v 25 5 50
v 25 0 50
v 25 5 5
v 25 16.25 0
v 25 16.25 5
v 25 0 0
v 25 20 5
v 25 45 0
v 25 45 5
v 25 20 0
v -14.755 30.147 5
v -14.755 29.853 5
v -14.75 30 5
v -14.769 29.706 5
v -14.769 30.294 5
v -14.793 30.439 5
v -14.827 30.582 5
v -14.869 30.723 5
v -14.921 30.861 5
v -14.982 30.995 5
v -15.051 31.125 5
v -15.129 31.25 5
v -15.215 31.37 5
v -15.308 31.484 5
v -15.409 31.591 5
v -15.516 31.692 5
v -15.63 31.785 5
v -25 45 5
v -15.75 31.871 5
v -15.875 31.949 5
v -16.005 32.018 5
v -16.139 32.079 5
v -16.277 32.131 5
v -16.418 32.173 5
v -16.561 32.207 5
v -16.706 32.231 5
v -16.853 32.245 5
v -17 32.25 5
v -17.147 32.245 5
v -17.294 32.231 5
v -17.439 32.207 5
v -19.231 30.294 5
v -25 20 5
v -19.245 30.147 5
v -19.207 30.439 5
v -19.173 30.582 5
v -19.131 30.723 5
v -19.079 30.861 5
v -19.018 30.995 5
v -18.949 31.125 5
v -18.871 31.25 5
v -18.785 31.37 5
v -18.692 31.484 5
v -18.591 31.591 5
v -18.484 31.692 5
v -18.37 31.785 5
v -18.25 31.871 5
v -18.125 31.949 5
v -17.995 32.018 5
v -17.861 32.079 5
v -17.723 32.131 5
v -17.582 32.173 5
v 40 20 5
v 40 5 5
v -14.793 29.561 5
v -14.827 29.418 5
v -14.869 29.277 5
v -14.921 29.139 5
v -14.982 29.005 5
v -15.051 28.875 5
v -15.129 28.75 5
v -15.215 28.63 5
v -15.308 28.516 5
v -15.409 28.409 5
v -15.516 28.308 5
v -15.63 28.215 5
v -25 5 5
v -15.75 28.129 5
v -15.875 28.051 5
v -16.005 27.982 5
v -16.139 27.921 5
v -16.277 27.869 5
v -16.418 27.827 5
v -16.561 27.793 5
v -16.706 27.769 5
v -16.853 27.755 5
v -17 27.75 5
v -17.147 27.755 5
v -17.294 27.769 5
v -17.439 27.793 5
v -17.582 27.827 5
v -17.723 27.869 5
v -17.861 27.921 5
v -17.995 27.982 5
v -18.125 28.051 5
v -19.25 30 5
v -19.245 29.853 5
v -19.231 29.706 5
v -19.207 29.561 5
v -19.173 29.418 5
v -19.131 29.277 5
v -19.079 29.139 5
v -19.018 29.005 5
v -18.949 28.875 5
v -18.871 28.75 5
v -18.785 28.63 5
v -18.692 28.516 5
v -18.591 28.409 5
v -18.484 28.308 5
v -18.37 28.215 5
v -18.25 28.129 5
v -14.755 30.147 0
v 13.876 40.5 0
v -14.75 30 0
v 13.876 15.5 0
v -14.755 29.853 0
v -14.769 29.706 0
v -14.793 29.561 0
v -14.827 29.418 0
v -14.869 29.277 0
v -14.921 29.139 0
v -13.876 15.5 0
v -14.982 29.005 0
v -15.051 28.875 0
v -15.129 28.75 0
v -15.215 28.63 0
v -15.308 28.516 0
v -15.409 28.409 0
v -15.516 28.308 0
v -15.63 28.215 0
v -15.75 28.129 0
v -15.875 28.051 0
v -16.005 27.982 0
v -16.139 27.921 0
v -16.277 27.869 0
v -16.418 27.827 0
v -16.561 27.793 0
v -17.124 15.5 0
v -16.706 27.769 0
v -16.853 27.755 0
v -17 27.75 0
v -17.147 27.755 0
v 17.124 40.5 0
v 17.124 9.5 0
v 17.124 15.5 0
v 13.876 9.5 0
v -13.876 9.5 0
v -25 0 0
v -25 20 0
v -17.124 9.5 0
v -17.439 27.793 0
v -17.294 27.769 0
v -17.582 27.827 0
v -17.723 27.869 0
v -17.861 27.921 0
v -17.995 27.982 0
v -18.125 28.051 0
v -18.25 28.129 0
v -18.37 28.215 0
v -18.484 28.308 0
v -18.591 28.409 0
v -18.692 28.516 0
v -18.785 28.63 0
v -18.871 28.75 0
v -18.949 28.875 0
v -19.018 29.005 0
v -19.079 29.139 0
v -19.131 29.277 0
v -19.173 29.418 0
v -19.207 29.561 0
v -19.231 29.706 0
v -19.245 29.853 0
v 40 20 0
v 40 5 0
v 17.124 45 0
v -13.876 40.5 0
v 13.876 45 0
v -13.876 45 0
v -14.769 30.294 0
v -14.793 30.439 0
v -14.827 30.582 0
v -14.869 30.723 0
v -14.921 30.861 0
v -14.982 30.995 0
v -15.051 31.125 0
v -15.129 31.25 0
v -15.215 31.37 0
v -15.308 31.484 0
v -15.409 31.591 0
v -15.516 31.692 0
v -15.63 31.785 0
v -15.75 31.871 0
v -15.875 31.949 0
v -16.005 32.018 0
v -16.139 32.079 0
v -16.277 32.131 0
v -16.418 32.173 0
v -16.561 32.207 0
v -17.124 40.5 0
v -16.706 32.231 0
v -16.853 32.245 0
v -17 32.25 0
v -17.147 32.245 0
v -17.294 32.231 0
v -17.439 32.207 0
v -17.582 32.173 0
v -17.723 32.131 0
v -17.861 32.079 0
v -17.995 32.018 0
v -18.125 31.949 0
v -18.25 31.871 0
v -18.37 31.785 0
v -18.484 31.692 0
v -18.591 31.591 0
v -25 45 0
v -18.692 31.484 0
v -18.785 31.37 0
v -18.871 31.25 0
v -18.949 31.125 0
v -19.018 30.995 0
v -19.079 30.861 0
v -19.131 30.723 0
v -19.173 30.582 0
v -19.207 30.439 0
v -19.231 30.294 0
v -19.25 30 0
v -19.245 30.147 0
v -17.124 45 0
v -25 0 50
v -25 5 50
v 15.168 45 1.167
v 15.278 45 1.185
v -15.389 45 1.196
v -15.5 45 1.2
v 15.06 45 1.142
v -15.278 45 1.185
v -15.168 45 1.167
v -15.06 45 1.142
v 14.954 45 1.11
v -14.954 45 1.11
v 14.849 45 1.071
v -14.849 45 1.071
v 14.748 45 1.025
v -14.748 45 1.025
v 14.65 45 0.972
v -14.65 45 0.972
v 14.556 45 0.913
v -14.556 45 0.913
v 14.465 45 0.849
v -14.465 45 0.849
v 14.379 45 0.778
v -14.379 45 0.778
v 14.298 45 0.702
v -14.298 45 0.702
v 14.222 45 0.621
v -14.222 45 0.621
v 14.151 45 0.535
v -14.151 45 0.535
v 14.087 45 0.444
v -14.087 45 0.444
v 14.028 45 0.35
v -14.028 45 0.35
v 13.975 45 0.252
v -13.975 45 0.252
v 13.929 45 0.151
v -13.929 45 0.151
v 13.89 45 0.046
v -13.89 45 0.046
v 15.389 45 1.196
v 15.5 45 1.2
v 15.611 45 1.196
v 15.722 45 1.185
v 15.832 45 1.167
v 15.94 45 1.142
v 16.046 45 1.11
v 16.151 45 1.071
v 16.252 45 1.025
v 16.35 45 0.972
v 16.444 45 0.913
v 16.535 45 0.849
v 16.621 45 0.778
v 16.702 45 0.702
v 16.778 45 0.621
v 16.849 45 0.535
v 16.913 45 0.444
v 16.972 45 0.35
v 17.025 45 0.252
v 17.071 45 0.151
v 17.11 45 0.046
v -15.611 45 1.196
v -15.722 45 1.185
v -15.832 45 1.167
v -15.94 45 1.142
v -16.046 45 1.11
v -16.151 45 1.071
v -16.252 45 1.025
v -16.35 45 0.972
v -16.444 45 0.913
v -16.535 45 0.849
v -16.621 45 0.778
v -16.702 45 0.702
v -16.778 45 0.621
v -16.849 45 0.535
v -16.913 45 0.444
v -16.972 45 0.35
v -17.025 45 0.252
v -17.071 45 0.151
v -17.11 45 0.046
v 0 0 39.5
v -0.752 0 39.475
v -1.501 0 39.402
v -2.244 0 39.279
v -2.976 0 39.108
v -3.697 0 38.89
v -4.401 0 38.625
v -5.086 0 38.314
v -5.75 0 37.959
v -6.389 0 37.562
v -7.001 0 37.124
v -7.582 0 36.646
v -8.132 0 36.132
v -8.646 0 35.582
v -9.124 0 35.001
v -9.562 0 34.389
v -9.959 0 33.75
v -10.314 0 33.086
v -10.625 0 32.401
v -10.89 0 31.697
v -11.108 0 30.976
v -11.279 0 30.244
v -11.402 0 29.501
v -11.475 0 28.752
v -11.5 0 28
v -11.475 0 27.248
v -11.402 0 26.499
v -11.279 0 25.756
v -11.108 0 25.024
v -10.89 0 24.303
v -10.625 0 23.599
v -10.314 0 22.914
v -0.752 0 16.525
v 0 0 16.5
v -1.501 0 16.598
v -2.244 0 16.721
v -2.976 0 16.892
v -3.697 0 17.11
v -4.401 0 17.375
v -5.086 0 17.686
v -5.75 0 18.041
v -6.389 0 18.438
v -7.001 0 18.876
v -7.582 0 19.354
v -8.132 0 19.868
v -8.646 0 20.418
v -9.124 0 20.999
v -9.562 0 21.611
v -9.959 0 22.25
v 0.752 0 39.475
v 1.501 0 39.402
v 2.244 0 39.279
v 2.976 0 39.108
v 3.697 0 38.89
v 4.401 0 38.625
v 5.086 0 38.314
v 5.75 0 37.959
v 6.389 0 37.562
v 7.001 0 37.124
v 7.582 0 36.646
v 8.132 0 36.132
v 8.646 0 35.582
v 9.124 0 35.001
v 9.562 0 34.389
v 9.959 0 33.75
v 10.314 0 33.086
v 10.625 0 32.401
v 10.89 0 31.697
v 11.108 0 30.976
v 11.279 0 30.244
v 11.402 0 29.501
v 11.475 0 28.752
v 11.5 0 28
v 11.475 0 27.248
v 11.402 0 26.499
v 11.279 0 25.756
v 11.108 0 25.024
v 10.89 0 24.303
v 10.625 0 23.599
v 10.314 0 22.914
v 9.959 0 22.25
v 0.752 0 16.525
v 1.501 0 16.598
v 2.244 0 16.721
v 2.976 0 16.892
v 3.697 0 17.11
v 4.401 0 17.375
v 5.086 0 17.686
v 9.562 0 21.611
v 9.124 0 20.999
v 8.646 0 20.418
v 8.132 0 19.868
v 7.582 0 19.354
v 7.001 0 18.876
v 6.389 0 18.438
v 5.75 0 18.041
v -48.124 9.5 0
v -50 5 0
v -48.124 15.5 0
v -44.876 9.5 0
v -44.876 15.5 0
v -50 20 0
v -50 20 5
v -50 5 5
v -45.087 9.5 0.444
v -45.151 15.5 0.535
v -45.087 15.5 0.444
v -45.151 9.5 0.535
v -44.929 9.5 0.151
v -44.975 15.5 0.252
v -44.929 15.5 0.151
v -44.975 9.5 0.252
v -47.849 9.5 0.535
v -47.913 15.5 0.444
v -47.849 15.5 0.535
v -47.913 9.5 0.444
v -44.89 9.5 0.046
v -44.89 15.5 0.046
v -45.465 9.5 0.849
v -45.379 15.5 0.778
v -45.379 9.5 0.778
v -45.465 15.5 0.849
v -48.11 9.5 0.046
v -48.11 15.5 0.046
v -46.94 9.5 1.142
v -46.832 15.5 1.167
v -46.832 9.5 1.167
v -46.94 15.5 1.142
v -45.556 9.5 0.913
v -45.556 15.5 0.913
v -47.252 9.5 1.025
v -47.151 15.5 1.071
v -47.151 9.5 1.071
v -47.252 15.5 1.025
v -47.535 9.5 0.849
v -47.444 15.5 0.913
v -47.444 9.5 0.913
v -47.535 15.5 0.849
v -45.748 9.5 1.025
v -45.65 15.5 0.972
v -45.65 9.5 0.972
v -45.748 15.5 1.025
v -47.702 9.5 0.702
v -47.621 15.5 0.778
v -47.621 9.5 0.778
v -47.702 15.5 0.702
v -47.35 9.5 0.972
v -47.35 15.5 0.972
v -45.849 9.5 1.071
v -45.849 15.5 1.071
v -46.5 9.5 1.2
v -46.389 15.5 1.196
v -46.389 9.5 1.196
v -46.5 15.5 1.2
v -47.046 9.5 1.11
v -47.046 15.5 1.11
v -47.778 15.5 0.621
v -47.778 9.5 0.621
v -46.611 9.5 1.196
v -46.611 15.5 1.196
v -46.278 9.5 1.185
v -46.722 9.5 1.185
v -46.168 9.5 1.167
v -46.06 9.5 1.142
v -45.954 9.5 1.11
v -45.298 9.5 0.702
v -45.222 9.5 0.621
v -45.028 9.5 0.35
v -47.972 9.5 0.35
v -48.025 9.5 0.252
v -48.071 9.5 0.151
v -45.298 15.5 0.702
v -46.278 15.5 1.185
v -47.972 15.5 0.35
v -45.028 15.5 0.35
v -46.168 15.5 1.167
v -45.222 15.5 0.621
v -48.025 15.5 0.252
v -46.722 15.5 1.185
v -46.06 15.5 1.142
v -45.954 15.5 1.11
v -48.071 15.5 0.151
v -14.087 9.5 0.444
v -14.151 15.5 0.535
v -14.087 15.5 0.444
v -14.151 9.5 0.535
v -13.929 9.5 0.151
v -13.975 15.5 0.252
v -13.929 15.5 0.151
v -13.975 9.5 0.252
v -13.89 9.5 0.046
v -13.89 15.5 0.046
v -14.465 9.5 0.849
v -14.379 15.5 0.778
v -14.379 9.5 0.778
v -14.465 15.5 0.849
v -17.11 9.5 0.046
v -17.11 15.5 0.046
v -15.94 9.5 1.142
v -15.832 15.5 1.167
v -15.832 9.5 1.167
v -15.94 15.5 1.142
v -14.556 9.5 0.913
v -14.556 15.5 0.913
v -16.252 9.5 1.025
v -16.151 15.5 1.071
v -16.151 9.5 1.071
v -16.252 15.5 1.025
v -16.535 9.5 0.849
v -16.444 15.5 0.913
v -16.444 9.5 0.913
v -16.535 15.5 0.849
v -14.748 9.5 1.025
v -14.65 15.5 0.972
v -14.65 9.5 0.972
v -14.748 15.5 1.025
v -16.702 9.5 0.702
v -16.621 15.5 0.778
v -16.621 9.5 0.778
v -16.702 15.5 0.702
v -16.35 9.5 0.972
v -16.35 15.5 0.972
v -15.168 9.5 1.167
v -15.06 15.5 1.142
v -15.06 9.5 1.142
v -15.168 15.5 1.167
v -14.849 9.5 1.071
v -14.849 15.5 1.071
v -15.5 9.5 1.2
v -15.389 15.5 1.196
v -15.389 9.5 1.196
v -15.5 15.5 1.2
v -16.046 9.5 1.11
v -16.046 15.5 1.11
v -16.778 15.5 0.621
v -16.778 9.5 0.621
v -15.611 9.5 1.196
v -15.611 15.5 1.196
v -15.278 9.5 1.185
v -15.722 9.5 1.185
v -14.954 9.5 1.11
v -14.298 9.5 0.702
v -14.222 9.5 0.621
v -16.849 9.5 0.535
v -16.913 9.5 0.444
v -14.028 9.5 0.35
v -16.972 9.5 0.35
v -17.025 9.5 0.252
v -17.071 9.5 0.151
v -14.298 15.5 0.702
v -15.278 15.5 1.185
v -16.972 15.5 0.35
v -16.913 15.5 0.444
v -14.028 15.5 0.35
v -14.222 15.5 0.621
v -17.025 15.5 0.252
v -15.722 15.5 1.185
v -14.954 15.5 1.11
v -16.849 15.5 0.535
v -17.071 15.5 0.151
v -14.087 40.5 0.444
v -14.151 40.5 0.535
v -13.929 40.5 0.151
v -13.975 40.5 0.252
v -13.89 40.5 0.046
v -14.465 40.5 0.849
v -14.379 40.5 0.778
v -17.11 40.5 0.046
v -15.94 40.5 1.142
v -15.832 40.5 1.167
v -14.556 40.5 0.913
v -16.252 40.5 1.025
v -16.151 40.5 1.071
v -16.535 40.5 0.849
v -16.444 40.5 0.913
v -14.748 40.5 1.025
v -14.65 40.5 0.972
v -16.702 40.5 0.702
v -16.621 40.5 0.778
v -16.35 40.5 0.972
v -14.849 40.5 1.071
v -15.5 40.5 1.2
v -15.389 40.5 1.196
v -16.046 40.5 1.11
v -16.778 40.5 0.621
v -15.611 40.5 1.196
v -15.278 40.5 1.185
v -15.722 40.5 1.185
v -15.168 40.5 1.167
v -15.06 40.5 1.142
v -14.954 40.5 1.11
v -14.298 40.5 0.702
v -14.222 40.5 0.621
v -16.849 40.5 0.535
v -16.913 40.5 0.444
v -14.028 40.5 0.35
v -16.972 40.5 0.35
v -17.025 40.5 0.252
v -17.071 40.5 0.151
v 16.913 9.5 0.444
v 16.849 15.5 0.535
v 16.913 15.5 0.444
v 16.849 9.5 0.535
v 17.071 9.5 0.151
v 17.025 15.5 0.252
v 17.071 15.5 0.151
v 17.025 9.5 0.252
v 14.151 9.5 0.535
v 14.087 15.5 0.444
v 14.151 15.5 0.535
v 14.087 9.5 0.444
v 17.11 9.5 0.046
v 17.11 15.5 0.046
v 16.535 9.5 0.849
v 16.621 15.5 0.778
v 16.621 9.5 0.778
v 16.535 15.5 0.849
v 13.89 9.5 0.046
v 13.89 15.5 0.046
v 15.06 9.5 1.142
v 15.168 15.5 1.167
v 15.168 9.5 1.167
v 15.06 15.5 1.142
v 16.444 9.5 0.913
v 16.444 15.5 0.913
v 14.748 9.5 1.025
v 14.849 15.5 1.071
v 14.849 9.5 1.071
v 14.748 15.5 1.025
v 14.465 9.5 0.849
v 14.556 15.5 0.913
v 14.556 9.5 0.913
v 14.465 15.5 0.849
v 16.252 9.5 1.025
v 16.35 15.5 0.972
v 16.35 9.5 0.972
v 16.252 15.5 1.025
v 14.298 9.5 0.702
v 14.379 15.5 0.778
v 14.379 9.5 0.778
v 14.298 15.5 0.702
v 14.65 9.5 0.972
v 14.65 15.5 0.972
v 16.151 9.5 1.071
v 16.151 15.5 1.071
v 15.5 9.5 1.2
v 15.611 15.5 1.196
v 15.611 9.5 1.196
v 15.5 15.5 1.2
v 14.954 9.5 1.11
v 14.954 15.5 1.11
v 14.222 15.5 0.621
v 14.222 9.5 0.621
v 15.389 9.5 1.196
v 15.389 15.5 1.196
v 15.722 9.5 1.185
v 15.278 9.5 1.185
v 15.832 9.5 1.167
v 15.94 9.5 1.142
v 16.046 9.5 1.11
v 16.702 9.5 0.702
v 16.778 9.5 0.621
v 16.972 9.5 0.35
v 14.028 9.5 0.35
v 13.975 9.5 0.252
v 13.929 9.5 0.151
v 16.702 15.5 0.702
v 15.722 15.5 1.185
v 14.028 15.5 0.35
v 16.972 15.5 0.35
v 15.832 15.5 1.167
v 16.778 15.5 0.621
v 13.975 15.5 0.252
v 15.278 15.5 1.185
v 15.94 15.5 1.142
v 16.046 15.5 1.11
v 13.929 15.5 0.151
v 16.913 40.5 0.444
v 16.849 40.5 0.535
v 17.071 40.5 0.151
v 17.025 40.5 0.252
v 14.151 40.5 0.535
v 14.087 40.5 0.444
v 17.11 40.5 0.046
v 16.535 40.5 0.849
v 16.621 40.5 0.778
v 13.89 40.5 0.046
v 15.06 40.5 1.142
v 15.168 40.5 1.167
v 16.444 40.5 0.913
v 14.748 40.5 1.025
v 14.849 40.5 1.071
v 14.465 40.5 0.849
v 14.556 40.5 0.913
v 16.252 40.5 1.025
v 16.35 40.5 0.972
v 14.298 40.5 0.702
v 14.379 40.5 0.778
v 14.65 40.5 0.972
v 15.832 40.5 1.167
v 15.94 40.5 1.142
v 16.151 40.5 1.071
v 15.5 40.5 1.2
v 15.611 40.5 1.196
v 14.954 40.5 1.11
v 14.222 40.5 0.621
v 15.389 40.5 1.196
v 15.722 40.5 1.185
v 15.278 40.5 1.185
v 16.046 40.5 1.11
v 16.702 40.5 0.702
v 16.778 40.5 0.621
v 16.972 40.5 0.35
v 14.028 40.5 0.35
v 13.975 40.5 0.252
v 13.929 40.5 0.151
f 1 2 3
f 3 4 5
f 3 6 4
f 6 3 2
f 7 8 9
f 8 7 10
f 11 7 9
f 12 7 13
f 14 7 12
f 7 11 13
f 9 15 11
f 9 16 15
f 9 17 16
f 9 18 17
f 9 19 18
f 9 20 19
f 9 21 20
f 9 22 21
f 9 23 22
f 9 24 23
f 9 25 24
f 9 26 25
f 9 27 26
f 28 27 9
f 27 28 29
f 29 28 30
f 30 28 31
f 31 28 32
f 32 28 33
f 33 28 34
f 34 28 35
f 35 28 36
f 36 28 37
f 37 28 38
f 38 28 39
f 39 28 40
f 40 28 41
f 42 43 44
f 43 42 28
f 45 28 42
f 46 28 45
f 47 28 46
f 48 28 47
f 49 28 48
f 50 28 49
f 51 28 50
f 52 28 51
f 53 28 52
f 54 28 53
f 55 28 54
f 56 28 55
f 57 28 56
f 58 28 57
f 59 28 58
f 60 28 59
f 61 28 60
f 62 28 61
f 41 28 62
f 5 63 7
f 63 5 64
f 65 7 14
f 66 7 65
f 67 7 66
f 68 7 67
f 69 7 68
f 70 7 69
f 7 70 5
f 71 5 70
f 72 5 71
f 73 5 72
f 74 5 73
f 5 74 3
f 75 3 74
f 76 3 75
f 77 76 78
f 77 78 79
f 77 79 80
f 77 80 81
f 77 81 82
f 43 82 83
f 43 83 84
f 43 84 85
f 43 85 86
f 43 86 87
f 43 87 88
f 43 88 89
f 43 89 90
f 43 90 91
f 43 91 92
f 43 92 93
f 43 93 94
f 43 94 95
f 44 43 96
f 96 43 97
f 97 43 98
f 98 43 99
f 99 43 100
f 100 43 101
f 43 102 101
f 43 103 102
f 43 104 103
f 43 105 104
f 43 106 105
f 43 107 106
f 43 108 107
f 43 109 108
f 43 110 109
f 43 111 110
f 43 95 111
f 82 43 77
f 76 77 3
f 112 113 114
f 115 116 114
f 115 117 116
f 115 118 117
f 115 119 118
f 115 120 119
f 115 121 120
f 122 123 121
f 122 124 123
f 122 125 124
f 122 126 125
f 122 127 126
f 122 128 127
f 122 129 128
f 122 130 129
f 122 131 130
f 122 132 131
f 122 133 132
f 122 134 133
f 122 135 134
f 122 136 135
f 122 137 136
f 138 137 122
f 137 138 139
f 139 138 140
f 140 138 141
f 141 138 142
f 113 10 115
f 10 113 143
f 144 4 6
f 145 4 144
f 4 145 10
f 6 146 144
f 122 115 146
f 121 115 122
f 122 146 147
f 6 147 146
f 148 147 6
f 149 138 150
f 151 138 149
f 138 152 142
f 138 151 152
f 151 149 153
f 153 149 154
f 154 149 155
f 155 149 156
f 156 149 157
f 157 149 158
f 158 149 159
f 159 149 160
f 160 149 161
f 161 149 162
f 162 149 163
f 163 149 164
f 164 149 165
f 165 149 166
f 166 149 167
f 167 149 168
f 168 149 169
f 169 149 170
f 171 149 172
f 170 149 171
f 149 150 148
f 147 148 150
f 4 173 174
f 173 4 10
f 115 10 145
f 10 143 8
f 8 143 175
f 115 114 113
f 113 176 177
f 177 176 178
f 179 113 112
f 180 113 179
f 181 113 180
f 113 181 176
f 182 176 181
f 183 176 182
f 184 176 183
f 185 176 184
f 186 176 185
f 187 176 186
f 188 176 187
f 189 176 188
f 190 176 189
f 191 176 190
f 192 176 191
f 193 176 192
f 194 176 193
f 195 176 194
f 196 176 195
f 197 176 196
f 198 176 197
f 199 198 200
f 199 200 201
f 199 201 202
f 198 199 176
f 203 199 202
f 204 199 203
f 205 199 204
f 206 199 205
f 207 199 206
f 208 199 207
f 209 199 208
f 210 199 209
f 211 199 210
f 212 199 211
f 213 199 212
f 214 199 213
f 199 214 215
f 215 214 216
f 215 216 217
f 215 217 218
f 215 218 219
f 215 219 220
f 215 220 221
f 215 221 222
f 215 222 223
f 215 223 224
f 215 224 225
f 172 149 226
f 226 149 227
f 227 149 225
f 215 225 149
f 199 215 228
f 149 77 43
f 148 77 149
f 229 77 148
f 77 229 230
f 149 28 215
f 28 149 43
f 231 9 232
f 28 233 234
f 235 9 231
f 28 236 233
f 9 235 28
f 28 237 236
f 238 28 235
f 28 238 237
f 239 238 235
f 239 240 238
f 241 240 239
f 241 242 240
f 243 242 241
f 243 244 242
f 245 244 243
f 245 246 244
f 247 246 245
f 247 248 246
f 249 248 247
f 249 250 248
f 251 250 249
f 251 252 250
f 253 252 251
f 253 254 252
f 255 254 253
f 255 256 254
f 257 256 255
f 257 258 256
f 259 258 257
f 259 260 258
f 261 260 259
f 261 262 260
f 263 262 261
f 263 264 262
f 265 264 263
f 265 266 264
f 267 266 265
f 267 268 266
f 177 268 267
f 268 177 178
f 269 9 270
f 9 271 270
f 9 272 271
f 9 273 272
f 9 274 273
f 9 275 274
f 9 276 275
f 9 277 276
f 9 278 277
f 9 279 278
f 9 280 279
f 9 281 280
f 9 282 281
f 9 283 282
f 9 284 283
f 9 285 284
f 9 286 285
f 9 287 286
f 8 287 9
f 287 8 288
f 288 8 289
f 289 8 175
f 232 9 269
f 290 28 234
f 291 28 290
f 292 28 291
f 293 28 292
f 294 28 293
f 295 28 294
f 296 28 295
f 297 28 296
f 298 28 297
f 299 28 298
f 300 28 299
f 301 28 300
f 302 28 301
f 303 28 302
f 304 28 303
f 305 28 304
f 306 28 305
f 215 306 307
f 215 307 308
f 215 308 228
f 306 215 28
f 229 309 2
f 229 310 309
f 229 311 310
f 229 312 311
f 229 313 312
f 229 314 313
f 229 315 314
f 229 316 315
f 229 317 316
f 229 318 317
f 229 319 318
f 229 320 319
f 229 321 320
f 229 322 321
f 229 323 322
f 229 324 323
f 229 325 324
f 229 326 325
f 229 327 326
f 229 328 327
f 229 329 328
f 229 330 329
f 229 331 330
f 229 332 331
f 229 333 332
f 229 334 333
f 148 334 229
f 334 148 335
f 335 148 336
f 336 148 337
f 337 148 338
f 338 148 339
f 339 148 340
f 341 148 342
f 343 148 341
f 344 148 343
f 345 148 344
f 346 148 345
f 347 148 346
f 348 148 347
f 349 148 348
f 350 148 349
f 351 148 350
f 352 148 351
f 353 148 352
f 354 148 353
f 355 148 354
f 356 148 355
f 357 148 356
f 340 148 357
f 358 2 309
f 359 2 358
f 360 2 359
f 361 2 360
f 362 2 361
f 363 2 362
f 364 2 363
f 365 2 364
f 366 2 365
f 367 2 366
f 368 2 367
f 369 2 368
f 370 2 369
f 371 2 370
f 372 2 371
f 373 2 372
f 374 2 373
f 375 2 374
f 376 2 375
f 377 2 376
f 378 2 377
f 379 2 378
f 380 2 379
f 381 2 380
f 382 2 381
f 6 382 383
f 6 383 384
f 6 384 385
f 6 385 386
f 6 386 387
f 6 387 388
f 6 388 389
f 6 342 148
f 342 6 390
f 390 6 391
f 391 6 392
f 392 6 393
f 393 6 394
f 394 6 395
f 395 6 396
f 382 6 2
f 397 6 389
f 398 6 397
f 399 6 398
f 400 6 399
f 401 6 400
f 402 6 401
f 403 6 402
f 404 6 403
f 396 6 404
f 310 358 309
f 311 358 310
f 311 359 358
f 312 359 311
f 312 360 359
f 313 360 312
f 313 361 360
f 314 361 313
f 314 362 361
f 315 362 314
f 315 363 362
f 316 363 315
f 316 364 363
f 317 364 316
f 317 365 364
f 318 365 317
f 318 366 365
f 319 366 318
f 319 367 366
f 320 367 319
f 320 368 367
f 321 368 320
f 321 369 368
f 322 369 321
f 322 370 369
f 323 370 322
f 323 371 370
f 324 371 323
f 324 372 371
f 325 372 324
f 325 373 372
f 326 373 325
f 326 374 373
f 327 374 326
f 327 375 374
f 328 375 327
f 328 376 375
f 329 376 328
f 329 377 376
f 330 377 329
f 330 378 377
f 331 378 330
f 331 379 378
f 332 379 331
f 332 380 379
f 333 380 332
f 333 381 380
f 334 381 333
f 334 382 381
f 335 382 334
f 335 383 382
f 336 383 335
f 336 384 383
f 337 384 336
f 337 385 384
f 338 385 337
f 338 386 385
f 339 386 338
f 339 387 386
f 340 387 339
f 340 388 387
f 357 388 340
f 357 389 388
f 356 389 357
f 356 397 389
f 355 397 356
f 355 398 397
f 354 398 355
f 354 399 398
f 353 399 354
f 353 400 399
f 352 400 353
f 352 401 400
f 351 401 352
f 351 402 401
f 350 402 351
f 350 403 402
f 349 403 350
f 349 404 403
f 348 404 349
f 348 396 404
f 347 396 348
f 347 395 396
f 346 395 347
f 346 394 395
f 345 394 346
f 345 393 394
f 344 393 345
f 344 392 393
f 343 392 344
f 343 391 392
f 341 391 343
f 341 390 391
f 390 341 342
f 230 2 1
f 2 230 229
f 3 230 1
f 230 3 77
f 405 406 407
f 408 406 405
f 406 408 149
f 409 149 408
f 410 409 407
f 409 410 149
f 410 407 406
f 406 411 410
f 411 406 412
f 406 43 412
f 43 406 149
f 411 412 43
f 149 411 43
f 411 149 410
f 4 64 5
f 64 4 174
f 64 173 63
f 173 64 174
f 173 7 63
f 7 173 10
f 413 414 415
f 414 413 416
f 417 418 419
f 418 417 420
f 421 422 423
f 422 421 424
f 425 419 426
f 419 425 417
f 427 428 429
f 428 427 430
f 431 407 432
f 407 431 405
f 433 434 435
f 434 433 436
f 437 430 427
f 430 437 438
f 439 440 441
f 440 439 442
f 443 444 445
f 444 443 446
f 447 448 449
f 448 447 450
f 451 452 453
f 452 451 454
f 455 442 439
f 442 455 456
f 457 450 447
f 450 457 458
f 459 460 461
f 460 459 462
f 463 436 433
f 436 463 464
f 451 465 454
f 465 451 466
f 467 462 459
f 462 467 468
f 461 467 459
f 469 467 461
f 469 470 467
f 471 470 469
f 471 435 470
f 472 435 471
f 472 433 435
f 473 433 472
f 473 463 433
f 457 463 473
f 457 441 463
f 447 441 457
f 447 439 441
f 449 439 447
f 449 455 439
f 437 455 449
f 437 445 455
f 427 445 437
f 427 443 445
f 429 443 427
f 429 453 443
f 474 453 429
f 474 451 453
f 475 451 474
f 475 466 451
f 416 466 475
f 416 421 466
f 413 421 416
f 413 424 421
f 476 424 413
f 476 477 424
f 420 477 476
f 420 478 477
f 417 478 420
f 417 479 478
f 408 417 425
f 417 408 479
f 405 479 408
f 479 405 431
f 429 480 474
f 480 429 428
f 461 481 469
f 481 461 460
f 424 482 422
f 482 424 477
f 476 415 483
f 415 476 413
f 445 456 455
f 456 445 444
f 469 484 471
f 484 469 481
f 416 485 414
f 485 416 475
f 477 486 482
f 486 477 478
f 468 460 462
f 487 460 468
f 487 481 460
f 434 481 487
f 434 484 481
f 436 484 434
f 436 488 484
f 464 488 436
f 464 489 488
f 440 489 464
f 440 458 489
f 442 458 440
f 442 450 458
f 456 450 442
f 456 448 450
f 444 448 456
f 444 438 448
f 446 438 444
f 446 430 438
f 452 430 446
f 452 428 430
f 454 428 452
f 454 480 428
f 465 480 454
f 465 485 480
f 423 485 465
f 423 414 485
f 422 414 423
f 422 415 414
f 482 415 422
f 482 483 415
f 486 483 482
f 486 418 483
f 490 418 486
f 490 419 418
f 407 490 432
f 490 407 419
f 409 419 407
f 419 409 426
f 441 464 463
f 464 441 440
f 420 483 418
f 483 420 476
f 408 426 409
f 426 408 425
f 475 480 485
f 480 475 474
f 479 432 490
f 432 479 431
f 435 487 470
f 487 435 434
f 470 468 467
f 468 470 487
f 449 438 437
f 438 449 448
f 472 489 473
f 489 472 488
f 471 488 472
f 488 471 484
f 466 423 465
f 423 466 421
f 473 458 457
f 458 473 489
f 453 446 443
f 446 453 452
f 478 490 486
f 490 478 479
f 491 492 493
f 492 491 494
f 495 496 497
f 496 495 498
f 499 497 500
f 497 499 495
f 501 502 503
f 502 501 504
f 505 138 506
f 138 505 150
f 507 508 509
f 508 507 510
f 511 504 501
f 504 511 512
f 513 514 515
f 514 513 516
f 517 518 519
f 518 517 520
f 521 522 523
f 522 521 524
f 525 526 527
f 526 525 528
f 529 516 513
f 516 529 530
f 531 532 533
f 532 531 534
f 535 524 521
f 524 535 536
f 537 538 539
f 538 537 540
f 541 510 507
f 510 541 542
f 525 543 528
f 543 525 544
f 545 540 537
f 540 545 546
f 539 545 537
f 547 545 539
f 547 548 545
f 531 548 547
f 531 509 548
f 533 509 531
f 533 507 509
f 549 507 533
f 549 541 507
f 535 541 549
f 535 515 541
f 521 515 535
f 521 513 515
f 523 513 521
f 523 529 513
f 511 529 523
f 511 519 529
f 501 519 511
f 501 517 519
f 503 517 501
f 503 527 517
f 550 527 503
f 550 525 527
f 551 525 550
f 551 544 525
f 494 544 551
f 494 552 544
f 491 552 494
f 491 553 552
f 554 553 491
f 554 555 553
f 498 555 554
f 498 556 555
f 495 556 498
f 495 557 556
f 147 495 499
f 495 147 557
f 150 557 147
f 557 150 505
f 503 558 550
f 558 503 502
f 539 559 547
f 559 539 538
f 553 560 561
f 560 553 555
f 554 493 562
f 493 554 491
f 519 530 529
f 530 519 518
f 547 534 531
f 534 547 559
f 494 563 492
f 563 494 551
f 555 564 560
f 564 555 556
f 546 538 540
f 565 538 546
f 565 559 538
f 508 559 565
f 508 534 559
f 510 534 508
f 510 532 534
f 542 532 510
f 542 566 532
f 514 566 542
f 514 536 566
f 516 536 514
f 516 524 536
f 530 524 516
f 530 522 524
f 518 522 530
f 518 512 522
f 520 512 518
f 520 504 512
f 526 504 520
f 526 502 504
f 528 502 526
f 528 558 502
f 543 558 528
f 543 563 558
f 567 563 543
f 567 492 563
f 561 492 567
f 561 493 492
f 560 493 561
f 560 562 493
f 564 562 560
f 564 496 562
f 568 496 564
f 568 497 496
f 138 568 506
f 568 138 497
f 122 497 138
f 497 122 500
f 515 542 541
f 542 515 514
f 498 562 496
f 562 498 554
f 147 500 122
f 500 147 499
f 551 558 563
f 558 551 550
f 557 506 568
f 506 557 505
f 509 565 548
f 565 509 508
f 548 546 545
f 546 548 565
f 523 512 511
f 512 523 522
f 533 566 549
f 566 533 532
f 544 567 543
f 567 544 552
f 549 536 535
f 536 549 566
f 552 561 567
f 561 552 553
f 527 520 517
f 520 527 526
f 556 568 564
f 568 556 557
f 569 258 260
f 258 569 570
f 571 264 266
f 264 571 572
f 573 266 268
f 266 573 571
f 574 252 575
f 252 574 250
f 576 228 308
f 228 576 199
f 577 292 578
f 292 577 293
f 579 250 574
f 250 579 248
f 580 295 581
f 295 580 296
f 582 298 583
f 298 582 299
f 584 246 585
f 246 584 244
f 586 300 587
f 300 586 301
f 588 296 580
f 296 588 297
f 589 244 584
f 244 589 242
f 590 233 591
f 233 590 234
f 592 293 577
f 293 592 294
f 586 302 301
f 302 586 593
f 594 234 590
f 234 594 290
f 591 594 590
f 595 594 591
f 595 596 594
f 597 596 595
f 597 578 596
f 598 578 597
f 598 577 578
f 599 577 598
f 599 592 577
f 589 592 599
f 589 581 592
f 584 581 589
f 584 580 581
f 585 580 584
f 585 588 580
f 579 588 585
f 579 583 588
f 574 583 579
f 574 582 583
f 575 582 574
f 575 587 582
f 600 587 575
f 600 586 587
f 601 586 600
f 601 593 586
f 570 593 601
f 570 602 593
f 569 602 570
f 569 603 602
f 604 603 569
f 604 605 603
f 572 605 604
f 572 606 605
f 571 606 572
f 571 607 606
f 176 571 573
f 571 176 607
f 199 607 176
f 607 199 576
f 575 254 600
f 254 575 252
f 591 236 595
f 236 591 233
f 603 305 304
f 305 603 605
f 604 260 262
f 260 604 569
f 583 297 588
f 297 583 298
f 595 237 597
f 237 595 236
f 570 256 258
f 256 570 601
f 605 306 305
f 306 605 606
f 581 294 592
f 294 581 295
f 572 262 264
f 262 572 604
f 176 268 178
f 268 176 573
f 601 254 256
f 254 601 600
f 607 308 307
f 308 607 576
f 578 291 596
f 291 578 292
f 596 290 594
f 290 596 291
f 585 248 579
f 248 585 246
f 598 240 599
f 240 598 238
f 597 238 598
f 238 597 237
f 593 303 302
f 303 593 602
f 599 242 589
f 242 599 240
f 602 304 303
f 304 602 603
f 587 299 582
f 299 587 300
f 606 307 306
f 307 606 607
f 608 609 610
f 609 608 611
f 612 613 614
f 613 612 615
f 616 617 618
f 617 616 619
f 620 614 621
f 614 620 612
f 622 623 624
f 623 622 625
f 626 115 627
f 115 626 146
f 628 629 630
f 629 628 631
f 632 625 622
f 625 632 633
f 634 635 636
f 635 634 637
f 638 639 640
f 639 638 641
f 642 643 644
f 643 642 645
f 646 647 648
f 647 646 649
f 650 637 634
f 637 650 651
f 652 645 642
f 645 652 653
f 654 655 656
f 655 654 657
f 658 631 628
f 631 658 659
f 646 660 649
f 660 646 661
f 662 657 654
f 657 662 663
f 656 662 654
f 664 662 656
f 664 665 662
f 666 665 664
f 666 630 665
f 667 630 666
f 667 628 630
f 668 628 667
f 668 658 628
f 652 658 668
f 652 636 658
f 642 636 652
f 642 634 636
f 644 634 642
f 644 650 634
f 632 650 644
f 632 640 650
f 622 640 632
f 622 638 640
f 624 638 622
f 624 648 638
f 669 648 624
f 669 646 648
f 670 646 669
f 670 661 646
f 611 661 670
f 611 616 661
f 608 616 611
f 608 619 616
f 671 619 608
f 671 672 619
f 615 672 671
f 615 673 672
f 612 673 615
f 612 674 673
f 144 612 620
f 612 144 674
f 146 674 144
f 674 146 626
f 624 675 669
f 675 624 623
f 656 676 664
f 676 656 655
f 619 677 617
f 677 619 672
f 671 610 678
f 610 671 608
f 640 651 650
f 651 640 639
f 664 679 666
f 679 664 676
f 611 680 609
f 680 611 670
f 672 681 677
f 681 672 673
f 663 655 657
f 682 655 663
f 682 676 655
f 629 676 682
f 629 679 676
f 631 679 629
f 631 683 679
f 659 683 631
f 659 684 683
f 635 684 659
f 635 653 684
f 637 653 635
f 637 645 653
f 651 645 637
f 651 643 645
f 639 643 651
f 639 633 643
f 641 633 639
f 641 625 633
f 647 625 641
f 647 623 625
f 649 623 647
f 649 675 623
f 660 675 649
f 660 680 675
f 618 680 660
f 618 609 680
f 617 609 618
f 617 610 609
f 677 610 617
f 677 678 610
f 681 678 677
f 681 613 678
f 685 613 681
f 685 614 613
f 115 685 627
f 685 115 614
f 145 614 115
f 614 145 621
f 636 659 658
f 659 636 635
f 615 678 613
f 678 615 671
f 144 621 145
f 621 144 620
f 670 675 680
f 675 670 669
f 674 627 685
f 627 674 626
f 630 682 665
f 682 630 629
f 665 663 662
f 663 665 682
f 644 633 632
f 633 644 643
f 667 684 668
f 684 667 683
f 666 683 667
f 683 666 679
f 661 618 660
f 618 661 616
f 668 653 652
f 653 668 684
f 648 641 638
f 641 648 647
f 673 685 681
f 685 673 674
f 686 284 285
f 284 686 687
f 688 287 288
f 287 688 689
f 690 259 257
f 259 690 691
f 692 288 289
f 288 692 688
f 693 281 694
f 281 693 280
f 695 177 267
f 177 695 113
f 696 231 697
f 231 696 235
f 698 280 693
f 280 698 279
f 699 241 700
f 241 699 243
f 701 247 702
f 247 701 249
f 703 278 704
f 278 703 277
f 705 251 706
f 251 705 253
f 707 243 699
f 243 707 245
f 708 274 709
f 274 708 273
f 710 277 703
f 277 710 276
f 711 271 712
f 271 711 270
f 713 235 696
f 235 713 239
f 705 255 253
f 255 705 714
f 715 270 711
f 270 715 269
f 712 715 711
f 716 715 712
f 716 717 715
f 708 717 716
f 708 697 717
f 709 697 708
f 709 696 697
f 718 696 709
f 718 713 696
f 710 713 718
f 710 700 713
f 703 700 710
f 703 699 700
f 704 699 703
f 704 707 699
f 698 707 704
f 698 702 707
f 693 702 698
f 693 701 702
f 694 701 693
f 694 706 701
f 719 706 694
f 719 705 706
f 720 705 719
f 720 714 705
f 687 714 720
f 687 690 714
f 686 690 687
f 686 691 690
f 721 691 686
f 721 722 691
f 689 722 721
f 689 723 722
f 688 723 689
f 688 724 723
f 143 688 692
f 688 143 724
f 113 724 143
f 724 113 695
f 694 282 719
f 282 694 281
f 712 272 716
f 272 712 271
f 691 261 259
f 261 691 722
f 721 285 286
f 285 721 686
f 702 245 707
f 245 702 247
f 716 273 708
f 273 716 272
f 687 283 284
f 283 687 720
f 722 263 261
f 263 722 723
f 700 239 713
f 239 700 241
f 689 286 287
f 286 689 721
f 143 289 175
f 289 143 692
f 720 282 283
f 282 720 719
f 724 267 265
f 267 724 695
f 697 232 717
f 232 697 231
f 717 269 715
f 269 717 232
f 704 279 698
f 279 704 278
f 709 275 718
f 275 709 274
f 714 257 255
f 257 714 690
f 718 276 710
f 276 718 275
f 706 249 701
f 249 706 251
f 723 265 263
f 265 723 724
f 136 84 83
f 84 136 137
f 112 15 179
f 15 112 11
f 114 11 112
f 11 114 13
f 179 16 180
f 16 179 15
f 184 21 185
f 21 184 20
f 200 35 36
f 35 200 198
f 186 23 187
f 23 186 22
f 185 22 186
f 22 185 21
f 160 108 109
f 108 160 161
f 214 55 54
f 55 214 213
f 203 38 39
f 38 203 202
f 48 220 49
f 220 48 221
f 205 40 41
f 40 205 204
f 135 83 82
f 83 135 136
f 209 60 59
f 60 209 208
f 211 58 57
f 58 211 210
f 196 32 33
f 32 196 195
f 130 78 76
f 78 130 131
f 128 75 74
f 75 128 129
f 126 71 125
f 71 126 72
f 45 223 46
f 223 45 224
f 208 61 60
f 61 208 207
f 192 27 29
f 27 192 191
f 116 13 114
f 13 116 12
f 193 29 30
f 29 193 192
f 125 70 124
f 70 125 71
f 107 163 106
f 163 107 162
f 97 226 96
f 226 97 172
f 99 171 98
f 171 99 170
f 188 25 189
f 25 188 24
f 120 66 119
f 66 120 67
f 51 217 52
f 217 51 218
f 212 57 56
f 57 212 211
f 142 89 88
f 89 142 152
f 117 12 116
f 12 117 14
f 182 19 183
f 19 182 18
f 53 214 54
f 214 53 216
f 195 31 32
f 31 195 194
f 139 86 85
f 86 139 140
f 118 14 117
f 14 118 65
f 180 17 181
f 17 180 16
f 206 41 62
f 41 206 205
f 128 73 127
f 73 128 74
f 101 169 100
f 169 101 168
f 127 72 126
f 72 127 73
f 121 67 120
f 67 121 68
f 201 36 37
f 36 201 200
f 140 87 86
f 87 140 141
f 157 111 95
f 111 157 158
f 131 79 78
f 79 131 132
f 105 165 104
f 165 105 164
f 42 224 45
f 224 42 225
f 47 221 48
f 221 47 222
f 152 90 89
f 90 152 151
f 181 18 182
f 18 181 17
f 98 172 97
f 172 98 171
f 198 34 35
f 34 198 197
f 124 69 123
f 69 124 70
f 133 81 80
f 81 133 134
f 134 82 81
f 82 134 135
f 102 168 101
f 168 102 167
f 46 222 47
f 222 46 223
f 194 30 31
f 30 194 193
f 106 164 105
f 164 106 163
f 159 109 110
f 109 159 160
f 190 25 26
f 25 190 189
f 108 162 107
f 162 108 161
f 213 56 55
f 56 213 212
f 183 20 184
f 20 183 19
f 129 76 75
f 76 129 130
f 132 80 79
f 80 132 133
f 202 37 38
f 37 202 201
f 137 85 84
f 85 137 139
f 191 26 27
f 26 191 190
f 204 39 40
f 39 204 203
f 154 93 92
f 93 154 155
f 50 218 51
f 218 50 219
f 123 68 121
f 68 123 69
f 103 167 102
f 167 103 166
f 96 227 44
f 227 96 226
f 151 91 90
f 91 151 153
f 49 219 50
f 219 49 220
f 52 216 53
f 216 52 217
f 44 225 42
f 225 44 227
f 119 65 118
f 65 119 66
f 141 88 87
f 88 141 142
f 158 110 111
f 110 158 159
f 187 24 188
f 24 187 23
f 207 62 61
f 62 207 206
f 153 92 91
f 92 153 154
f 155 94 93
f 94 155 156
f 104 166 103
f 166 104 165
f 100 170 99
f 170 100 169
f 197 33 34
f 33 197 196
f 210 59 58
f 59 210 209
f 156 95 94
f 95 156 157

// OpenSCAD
// L-shaped mounting bracket for NEMA 17 stepper motor
// Print orientation: base plate on bed (z = 0), motor plate builds upward (+Z)

// ---------------- Parameters ----------------
base_x0      = -25;    // base plate: x start
base_x1      = 25;     // base plate: x end
base_y0      = 0;      // base plate: y start
base_y1      = 45;     // base plate: y end
base_z0      = 0;      // base plate: z start
base_z1      = 5;      // base plate: z end

hole_x       = -17;    // M4 through-hole x position
hole_y       = 30;     // M4 through-hole y position
hole_d       = 4.5;    // M4 hole diameter

motor_x0     = -25;    // motor plate: x start
motor_x1     = 25;     // motor plate: x end
motor_y0     = 0;      // motor plate: y start
motor_y1     = 5;      // motor plate: y end
motor_z0     = 0;      // motor plate: z start
motor_z1     = 50;     // motor plate: z end

boss_hole_d  = 23;     // motor centring boss hole diameter
boss_x       = 0;      // boss hole centre x
boss_z       = 28;     // boss hole centre z

screw_d      = 3.4;    // M3 screw hole diameter
screw_n      = 4;      // number of screw holes
screw_p      = 31;     // square pattern side length

gusset_t     = 5;      // gusset thickness (X direction)
gusset_y     = 20;     // gusset leg length along +Y
gusset_z     = 20;     // gusset leg length along +Z

eps          = 0.5;    // cutter overshoot past faces

$fn = 96;

// ---------------- Model ----------------
difference() {
    union() {
        // Base plate
        translate([base_x0, base_y0, base_z0])
            cube([base_x1 - base_x0, base_y1 - base_y0, base_z1 - base_z0]);

        // Vertical motor plate
        translate([motor_x0, motor_y0, motor_z0])
            cube([motor_x1 - motor_x0, motor_y1 - motor_y0, motor_z1 - motor_z0]);

        // Left gusset (x = -25 to -20)
        translate([-25, 0, 0])
            linear_extrude(height = gusset_t)
                polygon(points = [
                    [-25, 5],
                    [-25, gusset_y],
                    [0, gusset_y]
                ]);

        // Right gusset (x = 20 to 25)
        translate([20, 0, 0])
            linear_extrude(height = gusset_t)
                polygon(points = [
                    [20, 5],
                    [20, gusset_y],
                    [0, gusset_y]
                ]);
    }

    // M4 through-holes in base plate
    translate([hole_x, hole_y, -eps])
        cylinder(d = hole_d, h = base_z1 - base_z0 + 2 * eps);

    // Boss hole through motor plate (along Y)
    translate([boss_x, 0, boss_z])
        rotate([90, 0, 0])
            cylinder(d = boss_hole_d, h = motor_y1 - motor_y0 + 2 * eps);

    // M3 screw holes on square pattern, centred on boss hole
    for (i = [0 : screw_n - 1]) {
        for (j = [0 : screw_n - 1]) {
            x = (i - (screw_n - 1) / 2) * screw_p;
            y = (j - (screw_n - 1) / 2) * screw_p;
            translate([x, y, -eps])
                rotate([90, 0, 0])
                    cylinder(d = screw_d, h = motor_y1 - motor_y0 + 2 * eps);
        }
    }
}
